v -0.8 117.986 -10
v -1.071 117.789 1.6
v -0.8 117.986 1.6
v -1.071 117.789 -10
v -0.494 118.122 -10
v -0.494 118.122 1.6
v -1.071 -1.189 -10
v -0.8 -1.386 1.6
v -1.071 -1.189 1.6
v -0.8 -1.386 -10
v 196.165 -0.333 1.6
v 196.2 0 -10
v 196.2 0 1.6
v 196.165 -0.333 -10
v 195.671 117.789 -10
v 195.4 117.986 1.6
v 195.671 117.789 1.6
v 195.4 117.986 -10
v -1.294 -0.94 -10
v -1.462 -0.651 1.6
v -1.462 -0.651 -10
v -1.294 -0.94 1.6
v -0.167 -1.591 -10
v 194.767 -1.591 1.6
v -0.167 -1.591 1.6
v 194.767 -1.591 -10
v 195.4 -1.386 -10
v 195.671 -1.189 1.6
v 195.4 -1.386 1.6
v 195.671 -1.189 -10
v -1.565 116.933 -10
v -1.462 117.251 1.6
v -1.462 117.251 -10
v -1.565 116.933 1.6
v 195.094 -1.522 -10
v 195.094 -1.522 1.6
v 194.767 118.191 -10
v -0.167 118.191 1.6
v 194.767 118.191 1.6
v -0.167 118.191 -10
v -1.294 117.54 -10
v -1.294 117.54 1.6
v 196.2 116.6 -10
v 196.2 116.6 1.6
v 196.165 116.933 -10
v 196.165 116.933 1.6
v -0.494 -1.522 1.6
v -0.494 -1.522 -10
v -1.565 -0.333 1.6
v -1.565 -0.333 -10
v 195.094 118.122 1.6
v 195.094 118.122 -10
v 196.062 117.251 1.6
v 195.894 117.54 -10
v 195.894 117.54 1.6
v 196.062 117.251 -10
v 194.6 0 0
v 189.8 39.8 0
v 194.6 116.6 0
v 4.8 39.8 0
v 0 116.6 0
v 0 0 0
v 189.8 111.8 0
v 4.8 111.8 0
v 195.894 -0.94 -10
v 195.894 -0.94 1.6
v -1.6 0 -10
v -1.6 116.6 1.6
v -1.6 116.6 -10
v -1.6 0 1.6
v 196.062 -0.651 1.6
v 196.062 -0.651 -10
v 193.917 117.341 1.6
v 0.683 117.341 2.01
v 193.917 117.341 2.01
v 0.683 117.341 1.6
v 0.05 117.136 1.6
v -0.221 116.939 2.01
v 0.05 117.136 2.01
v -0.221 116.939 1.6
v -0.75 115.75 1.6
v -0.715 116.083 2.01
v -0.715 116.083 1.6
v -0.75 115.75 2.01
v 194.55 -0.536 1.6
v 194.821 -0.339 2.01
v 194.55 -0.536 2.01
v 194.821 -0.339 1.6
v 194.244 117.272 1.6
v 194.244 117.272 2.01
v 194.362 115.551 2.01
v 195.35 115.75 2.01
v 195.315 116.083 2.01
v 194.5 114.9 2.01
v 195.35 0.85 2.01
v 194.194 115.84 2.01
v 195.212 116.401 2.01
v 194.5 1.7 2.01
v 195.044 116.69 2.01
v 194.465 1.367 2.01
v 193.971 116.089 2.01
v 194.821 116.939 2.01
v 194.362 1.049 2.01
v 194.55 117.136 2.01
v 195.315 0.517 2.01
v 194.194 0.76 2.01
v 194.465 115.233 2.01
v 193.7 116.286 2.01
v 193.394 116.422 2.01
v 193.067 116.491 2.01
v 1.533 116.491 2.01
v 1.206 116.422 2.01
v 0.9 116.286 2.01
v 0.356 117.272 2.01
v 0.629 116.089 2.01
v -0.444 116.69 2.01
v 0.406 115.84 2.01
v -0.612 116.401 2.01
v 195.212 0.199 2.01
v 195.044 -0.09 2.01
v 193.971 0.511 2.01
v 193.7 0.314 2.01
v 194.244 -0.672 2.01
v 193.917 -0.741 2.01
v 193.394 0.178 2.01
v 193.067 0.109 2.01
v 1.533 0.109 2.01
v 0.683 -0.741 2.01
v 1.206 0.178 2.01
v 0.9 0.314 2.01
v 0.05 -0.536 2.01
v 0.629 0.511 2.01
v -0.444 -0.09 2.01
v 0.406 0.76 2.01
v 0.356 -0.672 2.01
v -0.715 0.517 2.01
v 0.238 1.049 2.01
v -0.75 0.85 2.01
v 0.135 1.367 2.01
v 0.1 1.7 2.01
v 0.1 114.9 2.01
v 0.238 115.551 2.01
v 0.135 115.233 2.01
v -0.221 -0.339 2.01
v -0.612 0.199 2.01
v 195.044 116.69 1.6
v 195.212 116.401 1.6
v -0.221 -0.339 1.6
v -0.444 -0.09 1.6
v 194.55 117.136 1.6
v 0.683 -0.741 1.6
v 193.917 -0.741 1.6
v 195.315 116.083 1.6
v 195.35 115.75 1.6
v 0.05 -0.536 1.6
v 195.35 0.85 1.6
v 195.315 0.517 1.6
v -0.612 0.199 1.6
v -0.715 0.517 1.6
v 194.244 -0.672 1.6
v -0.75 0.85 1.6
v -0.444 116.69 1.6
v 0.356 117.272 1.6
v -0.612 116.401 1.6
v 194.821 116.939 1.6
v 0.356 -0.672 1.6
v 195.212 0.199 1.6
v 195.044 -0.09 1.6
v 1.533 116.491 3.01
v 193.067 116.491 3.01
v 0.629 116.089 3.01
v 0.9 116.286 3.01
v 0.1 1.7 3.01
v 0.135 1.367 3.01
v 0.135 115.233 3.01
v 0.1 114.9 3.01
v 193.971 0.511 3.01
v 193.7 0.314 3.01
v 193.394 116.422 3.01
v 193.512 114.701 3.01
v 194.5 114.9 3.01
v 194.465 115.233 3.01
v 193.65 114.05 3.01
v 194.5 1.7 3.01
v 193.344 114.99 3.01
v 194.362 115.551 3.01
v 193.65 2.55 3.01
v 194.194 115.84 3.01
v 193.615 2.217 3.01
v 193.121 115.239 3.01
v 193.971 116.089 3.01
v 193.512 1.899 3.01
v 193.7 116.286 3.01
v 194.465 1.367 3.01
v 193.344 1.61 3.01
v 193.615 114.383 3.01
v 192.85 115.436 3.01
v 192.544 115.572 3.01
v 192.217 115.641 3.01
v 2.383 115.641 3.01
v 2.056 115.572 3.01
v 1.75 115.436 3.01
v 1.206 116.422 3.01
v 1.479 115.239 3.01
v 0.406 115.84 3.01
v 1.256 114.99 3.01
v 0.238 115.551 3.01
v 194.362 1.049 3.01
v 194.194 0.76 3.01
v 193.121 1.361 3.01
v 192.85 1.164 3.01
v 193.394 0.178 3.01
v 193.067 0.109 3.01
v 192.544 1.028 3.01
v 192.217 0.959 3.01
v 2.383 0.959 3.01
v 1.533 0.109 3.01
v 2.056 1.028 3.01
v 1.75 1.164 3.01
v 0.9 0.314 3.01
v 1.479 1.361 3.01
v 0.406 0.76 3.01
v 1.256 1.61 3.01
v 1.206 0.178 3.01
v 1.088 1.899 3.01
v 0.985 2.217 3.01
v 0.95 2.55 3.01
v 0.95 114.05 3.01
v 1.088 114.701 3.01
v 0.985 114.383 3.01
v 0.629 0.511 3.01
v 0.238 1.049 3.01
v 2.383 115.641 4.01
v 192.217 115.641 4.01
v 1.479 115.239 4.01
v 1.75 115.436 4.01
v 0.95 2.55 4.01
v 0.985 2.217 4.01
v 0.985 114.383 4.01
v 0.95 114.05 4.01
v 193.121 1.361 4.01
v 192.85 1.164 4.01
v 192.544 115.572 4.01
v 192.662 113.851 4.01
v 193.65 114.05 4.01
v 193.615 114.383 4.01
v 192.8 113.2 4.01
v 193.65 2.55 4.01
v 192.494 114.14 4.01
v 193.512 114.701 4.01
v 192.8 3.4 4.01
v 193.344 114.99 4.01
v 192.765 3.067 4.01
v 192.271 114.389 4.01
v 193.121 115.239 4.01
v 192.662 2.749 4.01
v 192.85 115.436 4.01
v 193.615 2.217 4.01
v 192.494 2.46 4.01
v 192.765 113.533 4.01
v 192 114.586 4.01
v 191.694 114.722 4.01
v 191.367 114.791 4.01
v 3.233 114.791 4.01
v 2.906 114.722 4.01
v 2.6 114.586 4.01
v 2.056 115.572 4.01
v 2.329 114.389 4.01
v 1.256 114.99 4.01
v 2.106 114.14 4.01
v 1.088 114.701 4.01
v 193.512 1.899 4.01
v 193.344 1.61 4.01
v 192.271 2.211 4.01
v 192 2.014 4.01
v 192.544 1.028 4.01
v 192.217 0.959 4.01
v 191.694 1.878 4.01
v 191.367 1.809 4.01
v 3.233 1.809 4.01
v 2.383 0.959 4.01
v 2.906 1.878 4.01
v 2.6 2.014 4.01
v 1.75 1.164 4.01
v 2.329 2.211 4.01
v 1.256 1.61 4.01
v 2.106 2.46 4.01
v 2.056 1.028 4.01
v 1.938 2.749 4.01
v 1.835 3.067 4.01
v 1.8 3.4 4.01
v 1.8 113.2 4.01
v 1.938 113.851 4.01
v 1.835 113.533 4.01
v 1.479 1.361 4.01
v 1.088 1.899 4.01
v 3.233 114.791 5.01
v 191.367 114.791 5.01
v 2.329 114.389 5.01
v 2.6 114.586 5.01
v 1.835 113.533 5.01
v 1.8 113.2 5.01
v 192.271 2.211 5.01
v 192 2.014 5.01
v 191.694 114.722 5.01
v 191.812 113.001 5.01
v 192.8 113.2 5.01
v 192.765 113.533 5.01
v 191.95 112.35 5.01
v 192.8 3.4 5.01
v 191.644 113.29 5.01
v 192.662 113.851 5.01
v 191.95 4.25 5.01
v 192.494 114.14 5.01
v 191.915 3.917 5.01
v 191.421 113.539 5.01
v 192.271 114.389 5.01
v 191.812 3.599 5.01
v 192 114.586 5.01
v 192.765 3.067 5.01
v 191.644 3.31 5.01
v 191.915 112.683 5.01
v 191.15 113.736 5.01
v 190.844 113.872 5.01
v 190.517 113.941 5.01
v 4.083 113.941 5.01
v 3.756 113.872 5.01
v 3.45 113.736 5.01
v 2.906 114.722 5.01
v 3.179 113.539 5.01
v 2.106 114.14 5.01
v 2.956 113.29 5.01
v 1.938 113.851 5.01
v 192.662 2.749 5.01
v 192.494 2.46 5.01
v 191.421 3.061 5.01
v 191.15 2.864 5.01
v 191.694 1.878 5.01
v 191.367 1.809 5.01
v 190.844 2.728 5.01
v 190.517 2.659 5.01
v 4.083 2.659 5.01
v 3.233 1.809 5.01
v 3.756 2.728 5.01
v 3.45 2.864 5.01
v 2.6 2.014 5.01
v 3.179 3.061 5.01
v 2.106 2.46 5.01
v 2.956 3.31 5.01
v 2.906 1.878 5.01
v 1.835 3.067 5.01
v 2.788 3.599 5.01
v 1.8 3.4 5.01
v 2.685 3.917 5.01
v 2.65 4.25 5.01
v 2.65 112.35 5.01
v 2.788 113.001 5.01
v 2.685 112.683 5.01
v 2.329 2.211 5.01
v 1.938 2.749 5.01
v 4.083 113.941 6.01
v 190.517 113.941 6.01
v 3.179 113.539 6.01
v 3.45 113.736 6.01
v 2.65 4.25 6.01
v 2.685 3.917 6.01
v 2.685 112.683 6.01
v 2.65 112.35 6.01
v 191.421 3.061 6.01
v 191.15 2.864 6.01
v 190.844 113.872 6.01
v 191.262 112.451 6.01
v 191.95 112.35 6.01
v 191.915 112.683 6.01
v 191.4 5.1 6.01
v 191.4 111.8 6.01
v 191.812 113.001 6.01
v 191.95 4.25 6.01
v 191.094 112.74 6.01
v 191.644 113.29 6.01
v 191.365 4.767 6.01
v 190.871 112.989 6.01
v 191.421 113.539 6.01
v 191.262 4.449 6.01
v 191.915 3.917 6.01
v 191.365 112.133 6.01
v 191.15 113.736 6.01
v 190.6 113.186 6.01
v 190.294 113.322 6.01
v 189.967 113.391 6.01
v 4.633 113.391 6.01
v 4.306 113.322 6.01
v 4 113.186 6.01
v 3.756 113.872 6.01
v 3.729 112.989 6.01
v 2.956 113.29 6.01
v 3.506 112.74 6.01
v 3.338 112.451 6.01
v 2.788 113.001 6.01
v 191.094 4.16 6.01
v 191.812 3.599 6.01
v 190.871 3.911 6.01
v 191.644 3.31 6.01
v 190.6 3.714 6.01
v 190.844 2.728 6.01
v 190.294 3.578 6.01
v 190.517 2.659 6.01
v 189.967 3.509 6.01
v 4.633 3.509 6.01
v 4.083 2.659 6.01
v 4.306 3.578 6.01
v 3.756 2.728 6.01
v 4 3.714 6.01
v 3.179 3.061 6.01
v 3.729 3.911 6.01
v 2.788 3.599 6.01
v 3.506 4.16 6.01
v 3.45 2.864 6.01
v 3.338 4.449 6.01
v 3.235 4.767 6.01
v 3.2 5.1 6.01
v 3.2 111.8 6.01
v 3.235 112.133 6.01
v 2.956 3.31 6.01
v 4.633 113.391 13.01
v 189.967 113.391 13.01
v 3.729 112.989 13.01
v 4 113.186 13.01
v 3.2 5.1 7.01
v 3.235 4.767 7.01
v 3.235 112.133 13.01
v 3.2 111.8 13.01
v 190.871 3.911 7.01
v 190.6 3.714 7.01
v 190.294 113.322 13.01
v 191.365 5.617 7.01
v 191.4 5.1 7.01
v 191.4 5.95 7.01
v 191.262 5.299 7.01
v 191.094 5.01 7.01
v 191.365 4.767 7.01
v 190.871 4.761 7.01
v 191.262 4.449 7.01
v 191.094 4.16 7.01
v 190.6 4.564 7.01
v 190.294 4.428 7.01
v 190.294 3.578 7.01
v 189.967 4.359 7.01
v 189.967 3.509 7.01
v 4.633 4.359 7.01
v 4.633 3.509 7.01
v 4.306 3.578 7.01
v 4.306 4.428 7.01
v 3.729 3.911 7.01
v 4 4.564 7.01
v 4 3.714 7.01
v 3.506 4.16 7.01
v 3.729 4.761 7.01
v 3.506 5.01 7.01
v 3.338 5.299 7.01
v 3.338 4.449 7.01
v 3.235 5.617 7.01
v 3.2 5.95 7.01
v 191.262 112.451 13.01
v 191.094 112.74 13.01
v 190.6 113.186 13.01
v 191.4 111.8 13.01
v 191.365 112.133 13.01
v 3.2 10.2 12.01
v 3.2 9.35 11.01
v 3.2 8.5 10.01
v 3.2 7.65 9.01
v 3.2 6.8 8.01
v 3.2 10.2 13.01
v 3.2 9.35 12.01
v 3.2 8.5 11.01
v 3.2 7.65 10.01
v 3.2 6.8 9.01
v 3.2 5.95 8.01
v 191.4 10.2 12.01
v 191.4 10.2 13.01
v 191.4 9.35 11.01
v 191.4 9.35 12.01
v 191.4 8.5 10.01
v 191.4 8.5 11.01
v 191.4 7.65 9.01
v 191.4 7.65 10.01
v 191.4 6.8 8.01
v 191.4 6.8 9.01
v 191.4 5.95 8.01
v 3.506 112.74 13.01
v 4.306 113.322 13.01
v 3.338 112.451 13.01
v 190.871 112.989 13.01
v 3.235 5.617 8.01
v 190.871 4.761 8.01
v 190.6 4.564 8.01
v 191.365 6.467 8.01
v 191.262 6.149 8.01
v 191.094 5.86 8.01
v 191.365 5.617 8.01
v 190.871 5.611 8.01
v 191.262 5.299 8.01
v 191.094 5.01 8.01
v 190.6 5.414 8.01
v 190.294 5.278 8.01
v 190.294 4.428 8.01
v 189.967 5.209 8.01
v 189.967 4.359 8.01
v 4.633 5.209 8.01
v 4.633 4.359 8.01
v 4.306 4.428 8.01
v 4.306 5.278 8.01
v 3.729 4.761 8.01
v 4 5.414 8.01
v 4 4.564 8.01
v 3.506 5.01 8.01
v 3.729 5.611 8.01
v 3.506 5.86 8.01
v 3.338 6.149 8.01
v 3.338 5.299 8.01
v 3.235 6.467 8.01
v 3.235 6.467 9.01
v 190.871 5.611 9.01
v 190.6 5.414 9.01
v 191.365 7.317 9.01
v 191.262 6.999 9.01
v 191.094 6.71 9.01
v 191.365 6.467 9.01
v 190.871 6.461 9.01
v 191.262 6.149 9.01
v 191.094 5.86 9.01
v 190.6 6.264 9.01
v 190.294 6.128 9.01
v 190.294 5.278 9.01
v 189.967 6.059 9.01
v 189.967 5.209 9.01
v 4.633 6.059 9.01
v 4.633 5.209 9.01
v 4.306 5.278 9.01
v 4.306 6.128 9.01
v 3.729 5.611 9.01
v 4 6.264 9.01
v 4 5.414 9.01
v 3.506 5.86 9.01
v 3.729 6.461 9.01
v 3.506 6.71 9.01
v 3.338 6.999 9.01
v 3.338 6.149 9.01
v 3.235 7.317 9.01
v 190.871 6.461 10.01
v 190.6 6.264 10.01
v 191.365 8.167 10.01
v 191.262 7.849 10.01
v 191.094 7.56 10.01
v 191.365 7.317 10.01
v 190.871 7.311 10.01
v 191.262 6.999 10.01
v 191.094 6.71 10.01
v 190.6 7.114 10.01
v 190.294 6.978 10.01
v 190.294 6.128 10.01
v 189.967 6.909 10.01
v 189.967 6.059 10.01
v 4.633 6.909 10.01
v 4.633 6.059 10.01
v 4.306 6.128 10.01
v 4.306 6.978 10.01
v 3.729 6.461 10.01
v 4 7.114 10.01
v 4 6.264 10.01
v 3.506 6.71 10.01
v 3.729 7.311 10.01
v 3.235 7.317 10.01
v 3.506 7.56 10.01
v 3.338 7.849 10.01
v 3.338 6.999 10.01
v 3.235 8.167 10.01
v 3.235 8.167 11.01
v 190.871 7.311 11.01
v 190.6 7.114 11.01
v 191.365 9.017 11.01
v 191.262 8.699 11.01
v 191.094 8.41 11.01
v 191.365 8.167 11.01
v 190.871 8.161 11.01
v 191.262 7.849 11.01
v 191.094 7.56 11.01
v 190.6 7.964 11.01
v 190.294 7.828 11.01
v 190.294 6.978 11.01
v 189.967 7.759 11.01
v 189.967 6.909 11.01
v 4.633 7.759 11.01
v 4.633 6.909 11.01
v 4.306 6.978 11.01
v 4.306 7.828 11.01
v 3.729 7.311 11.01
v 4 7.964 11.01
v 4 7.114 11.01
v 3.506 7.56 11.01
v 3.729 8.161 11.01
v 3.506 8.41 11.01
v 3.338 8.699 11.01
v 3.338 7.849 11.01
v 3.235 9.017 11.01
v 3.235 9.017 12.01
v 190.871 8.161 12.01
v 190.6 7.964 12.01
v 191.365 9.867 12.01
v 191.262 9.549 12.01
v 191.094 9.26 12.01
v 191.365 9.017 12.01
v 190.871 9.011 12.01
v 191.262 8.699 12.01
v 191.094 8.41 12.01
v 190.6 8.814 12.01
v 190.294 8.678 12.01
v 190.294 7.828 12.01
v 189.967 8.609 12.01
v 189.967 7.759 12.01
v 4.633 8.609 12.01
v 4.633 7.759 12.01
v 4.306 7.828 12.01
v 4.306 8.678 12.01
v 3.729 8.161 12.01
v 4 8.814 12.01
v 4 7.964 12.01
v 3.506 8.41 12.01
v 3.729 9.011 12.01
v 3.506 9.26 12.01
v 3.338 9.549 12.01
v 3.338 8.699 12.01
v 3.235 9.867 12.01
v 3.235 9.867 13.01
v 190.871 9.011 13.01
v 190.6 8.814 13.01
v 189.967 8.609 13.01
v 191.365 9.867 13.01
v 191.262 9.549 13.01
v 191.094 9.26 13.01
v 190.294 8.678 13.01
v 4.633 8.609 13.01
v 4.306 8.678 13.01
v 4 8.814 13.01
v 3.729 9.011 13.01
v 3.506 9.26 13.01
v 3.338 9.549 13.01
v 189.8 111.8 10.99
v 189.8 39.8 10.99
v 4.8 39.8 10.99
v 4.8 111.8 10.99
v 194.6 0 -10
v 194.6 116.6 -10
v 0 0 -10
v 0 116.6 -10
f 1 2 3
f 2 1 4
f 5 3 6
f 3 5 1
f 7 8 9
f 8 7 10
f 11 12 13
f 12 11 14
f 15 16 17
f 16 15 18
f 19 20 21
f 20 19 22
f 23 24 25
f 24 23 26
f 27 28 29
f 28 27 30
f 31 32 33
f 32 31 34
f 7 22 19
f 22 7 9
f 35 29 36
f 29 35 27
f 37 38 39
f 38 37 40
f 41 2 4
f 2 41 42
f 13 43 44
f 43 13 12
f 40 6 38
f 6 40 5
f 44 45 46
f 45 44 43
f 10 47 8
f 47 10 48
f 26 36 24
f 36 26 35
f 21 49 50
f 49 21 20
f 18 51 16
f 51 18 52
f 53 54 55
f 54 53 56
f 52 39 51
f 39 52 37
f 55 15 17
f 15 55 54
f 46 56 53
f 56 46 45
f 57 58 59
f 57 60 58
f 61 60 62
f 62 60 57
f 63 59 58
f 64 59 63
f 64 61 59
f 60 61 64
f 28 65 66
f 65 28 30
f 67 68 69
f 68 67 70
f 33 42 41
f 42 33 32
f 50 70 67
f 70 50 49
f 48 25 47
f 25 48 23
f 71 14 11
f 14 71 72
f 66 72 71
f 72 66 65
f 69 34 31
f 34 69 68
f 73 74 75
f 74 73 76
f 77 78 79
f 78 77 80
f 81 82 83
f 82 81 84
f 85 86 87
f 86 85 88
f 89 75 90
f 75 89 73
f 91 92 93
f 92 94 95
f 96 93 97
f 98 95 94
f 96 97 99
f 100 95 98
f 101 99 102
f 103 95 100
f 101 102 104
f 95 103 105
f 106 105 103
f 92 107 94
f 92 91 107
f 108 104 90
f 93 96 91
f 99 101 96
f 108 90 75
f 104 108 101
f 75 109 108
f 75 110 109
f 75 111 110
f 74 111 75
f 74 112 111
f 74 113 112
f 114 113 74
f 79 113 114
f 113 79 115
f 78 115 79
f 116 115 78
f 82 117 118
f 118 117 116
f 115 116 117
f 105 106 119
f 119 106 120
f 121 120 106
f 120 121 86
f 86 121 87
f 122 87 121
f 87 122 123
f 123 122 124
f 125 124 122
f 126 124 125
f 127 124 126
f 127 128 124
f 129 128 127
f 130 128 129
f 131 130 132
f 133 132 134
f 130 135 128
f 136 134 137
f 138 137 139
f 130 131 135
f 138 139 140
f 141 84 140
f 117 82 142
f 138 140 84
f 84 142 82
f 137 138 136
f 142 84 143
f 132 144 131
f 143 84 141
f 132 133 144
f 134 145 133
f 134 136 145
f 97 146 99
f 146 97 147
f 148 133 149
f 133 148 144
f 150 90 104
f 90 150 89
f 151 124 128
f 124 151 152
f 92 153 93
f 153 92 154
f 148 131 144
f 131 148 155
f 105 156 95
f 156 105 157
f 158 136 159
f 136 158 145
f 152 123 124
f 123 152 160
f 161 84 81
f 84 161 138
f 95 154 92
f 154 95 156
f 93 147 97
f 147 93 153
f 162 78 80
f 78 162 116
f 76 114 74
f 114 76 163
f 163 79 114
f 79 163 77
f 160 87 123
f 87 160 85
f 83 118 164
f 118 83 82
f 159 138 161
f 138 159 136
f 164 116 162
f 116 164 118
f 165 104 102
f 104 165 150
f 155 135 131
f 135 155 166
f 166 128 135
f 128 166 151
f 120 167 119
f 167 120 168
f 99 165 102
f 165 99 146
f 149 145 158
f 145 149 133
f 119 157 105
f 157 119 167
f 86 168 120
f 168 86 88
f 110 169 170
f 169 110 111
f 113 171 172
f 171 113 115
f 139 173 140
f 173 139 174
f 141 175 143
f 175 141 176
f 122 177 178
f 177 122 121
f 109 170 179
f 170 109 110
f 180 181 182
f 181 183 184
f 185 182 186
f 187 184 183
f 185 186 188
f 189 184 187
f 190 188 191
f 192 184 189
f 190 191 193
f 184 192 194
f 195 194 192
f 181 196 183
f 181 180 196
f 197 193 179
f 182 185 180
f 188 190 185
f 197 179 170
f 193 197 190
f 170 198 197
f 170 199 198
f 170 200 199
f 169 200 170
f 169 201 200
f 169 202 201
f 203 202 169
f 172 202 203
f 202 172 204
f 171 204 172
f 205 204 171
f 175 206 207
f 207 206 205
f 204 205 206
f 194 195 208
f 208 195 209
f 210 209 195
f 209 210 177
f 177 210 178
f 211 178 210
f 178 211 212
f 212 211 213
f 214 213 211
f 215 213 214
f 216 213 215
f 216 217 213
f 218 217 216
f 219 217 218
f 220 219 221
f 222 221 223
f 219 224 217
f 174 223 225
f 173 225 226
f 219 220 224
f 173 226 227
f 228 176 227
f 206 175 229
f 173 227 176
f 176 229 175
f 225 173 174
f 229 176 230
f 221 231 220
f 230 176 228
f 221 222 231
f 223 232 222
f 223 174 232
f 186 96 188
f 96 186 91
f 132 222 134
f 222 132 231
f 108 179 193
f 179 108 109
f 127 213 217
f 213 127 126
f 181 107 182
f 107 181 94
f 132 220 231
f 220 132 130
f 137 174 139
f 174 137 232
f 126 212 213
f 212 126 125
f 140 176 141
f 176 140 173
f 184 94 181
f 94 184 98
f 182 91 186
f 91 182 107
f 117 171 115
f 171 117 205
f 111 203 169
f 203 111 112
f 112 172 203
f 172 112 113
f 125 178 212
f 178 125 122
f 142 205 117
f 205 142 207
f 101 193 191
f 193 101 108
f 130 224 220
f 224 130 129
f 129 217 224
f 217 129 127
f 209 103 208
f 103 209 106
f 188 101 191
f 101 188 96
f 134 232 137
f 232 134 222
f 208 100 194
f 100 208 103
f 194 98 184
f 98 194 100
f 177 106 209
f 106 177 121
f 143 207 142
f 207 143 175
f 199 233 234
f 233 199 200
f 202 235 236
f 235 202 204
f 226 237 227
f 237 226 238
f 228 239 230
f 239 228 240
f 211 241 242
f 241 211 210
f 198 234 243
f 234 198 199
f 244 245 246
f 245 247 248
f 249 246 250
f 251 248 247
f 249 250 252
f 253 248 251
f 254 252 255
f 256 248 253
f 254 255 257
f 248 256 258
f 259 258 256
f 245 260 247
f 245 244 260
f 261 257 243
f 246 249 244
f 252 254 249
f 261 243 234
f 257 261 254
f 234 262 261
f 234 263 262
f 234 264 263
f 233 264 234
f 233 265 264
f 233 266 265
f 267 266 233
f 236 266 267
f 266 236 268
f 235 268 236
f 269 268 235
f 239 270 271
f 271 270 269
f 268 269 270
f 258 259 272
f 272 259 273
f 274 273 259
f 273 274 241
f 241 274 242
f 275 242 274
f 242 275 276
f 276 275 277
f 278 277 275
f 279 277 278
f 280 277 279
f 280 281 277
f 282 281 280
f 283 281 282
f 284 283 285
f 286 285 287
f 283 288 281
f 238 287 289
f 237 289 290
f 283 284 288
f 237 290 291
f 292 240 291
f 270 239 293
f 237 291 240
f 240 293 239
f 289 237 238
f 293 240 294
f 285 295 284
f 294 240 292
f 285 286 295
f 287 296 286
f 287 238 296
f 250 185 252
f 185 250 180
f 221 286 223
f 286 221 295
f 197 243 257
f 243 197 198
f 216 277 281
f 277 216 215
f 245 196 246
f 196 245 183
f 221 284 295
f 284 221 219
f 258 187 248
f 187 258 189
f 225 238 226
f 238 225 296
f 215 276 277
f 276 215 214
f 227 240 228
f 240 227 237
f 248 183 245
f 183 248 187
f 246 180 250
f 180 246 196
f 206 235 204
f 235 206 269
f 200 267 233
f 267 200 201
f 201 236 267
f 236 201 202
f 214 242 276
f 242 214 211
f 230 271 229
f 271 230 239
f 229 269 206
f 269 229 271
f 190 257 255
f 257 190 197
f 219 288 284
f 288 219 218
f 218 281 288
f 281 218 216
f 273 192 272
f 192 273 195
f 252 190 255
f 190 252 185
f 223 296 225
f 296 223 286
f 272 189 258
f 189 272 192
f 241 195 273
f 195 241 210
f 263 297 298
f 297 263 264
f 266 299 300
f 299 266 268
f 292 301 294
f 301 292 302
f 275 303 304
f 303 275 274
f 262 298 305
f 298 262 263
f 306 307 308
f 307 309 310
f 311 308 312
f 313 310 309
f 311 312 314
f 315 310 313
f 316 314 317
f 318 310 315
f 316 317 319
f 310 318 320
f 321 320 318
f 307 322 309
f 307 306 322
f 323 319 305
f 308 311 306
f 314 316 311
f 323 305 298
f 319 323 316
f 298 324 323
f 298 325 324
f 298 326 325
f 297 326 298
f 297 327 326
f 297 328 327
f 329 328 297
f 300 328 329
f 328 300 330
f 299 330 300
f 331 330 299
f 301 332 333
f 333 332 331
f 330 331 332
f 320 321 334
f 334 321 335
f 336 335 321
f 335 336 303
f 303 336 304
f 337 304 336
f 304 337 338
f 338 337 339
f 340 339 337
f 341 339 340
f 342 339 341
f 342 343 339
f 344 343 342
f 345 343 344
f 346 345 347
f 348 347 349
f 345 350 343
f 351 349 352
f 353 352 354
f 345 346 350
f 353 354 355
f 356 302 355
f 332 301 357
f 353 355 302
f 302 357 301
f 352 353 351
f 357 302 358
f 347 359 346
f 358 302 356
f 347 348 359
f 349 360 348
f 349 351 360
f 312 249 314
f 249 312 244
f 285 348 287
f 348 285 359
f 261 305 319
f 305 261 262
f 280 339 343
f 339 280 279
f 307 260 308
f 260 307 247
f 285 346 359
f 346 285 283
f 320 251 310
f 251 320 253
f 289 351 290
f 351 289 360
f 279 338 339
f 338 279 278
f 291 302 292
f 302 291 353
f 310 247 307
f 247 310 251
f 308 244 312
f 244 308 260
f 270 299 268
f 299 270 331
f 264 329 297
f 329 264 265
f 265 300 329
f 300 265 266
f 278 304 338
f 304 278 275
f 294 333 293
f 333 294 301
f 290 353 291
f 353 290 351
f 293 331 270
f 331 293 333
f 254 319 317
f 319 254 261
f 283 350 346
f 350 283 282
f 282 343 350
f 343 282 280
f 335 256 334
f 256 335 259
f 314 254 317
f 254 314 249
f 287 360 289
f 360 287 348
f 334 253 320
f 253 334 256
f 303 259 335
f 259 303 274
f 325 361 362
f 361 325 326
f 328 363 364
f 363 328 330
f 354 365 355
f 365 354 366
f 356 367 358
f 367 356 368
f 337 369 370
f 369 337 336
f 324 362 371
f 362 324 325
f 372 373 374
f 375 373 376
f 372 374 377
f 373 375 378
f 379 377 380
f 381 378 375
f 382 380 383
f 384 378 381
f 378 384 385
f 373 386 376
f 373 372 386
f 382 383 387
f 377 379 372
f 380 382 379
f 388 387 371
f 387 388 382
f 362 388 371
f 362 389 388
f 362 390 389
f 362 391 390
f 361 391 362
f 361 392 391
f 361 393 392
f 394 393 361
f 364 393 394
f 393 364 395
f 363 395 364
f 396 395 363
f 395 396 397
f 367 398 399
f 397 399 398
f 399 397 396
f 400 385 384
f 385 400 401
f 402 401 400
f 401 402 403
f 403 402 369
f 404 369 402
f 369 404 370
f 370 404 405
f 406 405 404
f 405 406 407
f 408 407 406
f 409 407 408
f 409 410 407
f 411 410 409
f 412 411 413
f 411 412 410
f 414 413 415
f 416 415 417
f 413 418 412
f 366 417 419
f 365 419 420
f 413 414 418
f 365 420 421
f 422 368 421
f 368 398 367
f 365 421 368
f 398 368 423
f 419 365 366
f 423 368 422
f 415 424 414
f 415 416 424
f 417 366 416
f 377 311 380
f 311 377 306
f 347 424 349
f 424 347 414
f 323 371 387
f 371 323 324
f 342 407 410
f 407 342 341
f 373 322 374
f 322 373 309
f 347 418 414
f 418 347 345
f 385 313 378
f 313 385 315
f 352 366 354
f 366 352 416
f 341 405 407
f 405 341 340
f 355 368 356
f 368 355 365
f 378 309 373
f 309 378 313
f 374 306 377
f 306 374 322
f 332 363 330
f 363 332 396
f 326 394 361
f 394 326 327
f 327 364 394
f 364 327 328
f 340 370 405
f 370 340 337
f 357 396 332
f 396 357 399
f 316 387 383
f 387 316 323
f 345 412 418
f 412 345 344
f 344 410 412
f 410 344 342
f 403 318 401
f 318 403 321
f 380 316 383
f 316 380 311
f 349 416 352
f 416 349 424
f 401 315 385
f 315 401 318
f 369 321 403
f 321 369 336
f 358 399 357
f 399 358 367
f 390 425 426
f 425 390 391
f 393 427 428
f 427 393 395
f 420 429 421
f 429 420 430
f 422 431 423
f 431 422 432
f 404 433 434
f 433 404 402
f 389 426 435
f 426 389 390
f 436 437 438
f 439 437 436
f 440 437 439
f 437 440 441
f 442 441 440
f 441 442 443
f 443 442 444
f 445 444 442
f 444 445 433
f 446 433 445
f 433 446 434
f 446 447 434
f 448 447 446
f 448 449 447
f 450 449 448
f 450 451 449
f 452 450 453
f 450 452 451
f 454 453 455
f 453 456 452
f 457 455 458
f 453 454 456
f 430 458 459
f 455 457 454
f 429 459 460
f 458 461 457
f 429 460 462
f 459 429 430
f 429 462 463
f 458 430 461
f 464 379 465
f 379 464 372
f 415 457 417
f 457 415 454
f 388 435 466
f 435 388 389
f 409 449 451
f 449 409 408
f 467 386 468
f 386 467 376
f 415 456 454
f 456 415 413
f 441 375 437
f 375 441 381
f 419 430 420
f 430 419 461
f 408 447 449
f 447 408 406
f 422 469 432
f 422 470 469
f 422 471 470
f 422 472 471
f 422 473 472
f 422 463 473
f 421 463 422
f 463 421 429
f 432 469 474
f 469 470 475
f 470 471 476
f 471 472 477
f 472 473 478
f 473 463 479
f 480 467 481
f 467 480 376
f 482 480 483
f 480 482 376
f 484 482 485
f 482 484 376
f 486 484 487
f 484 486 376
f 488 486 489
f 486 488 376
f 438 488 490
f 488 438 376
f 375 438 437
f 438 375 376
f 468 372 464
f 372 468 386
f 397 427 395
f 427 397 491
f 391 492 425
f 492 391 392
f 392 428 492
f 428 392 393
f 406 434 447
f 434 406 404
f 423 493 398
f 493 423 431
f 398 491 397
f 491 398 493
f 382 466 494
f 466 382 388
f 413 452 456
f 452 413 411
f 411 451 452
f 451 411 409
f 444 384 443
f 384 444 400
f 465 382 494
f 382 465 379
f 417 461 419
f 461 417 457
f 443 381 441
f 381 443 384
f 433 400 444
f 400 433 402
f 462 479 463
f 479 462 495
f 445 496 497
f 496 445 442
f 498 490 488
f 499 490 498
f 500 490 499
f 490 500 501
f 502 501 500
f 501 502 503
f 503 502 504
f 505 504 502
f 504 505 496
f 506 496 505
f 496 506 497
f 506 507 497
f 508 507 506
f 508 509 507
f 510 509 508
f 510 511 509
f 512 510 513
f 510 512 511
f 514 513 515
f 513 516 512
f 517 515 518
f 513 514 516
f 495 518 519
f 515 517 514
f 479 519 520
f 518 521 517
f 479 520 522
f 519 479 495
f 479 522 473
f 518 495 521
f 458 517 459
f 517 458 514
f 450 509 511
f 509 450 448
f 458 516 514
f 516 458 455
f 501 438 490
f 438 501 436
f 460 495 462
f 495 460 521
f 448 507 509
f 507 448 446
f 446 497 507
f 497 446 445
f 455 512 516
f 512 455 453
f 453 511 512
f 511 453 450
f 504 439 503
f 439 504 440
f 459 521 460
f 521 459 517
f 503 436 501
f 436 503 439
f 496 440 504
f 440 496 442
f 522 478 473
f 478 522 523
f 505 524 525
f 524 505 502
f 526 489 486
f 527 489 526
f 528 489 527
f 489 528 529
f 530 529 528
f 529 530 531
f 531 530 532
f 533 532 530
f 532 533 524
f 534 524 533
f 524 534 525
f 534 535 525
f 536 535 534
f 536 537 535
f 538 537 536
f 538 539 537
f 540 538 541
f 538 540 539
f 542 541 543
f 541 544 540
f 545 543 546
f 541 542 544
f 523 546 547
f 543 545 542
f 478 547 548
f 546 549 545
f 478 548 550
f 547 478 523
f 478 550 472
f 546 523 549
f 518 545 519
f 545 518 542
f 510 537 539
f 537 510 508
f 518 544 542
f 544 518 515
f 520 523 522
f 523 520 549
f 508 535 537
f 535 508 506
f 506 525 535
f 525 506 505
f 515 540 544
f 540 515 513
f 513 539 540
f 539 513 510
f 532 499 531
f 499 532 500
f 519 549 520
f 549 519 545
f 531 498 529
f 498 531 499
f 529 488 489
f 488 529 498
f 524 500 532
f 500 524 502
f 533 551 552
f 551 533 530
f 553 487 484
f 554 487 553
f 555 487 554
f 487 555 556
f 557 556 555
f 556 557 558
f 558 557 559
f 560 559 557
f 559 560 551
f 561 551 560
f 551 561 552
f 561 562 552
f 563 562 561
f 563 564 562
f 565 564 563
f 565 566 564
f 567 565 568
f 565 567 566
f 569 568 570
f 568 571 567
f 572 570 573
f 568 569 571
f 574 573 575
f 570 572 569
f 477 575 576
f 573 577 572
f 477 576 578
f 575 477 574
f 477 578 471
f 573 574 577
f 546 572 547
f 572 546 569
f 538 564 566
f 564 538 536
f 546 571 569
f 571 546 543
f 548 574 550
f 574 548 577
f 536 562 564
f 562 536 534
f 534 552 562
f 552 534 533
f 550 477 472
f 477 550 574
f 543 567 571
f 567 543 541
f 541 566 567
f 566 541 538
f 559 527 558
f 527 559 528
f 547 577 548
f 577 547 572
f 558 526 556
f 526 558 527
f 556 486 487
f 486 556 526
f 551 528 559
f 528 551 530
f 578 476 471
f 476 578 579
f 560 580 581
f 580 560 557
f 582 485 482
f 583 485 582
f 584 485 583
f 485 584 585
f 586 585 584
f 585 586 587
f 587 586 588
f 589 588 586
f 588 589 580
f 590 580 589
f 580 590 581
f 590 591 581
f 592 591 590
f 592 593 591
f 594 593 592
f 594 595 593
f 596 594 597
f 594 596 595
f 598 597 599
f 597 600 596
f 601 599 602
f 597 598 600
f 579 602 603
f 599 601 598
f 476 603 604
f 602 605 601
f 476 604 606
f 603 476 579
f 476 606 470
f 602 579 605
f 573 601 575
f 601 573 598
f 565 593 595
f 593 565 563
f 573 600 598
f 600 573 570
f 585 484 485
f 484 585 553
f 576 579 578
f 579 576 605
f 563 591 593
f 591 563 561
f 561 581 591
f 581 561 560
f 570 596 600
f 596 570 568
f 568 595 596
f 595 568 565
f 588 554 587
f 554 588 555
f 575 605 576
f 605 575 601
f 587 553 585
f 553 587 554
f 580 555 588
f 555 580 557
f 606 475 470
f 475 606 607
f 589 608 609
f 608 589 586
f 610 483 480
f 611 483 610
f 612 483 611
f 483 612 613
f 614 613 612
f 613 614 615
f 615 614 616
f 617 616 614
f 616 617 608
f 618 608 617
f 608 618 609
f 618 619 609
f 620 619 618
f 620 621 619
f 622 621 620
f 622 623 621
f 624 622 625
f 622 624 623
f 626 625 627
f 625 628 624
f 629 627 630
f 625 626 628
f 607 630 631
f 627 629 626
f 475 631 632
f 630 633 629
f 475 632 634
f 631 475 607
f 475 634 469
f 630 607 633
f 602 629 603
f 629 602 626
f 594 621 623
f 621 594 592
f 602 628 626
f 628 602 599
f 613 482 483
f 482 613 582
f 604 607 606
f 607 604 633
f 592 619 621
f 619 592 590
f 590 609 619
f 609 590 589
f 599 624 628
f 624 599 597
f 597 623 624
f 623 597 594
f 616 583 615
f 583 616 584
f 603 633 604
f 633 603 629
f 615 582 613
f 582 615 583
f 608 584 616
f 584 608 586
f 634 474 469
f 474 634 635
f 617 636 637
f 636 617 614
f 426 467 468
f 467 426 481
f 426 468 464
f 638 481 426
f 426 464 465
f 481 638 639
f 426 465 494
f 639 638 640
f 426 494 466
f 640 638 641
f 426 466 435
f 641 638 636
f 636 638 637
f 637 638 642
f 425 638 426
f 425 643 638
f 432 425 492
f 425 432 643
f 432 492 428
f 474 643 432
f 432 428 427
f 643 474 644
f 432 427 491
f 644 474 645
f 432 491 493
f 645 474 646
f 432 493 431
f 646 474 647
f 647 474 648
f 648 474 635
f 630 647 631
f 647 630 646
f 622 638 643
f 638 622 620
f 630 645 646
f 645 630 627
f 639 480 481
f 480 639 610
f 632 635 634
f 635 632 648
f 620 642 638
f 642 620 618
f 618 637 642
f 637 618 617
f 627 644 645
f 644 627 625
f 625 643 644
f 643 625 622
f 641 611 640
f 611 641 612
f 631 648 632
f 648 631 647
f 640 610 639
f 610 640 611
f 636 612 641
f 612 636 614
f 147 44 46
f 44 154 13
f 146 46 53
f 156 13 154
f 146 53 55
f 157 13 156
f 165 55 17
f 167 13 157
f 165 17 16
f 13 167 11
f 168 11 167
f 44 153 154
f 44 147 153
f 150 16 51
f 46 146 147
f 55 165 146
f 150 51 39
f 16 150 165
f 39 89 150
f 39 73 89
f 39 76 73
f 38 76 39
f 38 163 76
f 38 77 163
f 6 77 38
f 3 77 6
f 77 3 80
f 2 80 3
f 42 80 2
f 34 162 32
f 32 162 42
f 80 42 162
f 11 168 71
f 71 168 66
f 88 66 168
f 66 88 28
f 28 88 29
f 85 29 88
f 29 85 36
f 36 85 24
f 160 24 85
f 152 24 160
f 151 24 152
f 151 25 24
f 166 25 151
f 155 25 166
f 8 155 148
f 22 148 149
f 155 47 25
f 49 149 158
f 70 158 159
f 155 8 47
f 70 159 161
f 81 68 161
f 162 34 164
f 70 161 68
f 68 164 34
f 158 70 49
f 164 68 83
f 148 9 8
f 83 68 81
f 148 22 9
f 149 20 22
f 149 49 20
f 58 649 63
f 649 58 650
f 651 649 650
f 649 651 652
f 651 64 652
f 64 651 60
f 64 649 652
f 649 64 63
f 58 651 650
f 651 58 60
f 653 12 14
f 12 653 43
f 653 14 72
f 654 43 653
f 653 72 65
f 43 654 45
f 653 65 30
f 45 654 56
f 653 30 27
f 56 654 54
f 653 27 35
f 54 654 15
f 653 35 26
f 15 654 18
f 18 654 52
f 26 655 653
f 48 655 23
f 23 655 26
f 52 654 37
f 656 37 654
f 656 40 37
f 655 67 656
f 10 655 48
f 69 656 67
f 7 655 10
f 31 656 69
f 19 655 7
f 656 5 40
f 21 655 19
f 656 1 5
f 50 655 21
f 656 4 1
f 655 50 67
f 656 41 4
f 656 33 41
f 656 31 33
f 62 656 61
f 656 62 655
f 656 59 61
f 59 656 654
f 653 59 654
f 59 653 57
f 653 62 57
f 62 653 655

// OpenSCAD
thickness = 1.6; //thickness of case, too thin and case will be weak
top_thickness = 1.6; //if using acrylic needs to be larger than acrylic to allow for lip

width = 193.0; //device outer width (x)
depth = 115.0; //device outer depth (y)
extra_play = 1.6; //amount of extra space to allow for sizing uncertanty

//distance from edge to closest protruding control surface
inset_left = 4.0;
inset_right = 4.0;
inset_bottom = 39.0;
inset_top = 4.0;

case_space_above_face = 11.0;
lip_overhang = 10.0; //amount case overhangs device

case_z_resolution = 1.0; //multiple of z extrusion height recommended
$fn = 30;

device_width = width + extra_play; //add slight amount of play between case and device (2mm?)
device_depth = depth + extra_play; //add slight amount of play between case and device

case_face_inset_left = 4.0 + extra_play/2.0;
case_face_inset_right = 4.0 + extra_play/2.0;
case_face_inset_bottom = 39.0 + extra_play/2.0;
case_face_inset_top = 4.0 + extra_play/2.0;

use_acrylic_top = "false"; // [true,false]
show_acrylic_cutplan = "false"; // [true,false]
acrylic_top_thickness = 4.0;
acrylic_top_lip = 5.0;

object_max_print_width = 120;
number_of_tabs = 2.0;
print_tab_size = 5.0;

do_split_number = -1; // -1 generates whole model

if (use_acrylic_top == "true" && show_acrylic_cutplan == "true") {
    acrylic_cut_plan();
} else {
    if (do_split_number >= 0) {
        split(do_split_number); //split into sections via print sections
    } else {
        decksaver(); //full model
    }
}
 
module acrylic_cut_plan() {
   square([device_width - case_face_inset_left - case_face_inset_right,
    device_depth - case_face_inset_bottom - case_face_inset_top]);
}

function isOdd(x) = (x % 2) == 1;
//-------------------
//split model into tabbed objects
module split(split_number) {
    used_bed_size_x = object_max_print_width - print_tab_size;
    used_bed_size_y = 2 * device_depth;
    
    full_height = case_space_above_face + lip_overhang + 2*thickness + case_z_resolution; 
  
    tab_layers = number_of_tabs + 2; //number of layers that make up the tabbed objects
    for (i = [split_number: split_number]) {
        intersection(){
            union() {
                if (do_split_number == 0) {
                    //don't indent the left side of first section
                    cube([2*print_tab_size, used_bed_size_y, full_height]);
                }
                if (used_bed_size_x * i >= (device_width + 2*thickness)) {
                    //don't indent the right side of last section
                    translate([used_bed_size_x * i - print_tab_size - 0.1, 0, 0]) 
                        cube([2*print_tab_size, used_bed_size_y, full_height]);
                }
                //offset sections
                for(j = [0:tab_layers-1]) {
                    if (!isOdd(j)) {
                        translate([used_bed_size_x * i, 0, j * full_height/tab_layers]) 
                            cube([used_bed_size_x, used_bed_size_y, full_height/tab_layers]);
                    } else {
                        translate([used_bed_size_x * i - print_tab_size, 0, j * full_height/tab_layers]) 
                            cube([used_bed_size_x, used_bed_size_y, full_height/tab_layers]);
                    }
                }
            }
          translate([thickness+0.01,thickness+0.01,lip_overhang+0.01]) decksaver();
        }
    }
}

module decksaver() {
    union() {
        overhang();
        difference() {
            top_outer_shell();
            top_shell_empty_space();
            if (use_acrylic_top == "true") {
               translate([case_face_inset_left, case_face_inset_bottom,
                case_space_above_face + top_thickness - acrylic_top_thickness + case_z_resolution + 0.01])      acrylic_cutout();       
            }
        }
    }
}

module acrylic_cutout() {
    union() {
        //lip cuout
        translate([0,0,top_thickness - acrylic_top_thickness]) 
            cube([device_width - case_face_inset_left - case_face_inset_right,
                device_depth - case_face_inset_bottom - case_face_inset_top,
                top_thickness]);
        
        //acrylic cuout    
        translate([acrylic_top_lip, acrylic_top_lip, -top_thickness]) 
            cube([device_width - case_face_inset_left - case_face_inset_right - 2 * acrylic_top_lip,
                device_depth - case_face_inset_bottom - case_face_inset_top - 2 * acrylic_top_lip,
                top_thickness*3]);
    }
}

module overhang() {
    translate([0,0,-lip_overhang])
        linear_extrude(height = lip_overhang + 0.01, center = false, convexity = 10, twist = 0) {
            difference() {
                minkowski() {
                    square([device_width,device_depth]);
                    circle(thickness);
                }
                square([device_width,device_depth]);
            }
        }
}


//top outer shell
module top_outer_shell() {
step = case_z_resolution;
    union() {
        
       //lowest piece of the top deck 
       linear_extrude(height = top_thickness, center = false, convexity = 10, twist = 0) 
        minkowski() {
            polygon([[0,0], [0,device_depth], [device_width,device_depth],[device_width,0]]);
            circle(thickness);
        }
       
        
        //remaining piece above top deck
        maxheight = case_space_above_face + top_thickness;
        for (i = [0 : step : maxheight]) {
            ival = i * 0.85; //reduce grade to eliminate need for corner supports
            let (min_x = min(ival,case_face_inset_left), 
                min_y = min(ival,case_face_inset_bottom), 
                max_x = max(device_width - ival, device_width - case_face_inset_right), 
                max_y = max(device_depth - ival, device_depth - case_face_inset_top)) {
                translate([0,0,i]) {
                    linear_extrude(height = step+0.01, center = false, convexity = 10, twist = 0) 
                     minkowski() {
                        polygon([[min_x,min_y], [min_x,max_y], [max_x,max_y],[max_x,min_y]]);
                        circle(thickness);
                    }
                }        
            }
        }
    }
}

module top_shell_empty_space() {
    translate([case_face_inset_left, case_face_inset_bottom, -0.01])
        cube([device_width - case_face_inset_left - case_face_inset_right, 
            device_depth - case_face_inset_bottom - case_face_inset_top, 
            case_space_above_face]);
}
